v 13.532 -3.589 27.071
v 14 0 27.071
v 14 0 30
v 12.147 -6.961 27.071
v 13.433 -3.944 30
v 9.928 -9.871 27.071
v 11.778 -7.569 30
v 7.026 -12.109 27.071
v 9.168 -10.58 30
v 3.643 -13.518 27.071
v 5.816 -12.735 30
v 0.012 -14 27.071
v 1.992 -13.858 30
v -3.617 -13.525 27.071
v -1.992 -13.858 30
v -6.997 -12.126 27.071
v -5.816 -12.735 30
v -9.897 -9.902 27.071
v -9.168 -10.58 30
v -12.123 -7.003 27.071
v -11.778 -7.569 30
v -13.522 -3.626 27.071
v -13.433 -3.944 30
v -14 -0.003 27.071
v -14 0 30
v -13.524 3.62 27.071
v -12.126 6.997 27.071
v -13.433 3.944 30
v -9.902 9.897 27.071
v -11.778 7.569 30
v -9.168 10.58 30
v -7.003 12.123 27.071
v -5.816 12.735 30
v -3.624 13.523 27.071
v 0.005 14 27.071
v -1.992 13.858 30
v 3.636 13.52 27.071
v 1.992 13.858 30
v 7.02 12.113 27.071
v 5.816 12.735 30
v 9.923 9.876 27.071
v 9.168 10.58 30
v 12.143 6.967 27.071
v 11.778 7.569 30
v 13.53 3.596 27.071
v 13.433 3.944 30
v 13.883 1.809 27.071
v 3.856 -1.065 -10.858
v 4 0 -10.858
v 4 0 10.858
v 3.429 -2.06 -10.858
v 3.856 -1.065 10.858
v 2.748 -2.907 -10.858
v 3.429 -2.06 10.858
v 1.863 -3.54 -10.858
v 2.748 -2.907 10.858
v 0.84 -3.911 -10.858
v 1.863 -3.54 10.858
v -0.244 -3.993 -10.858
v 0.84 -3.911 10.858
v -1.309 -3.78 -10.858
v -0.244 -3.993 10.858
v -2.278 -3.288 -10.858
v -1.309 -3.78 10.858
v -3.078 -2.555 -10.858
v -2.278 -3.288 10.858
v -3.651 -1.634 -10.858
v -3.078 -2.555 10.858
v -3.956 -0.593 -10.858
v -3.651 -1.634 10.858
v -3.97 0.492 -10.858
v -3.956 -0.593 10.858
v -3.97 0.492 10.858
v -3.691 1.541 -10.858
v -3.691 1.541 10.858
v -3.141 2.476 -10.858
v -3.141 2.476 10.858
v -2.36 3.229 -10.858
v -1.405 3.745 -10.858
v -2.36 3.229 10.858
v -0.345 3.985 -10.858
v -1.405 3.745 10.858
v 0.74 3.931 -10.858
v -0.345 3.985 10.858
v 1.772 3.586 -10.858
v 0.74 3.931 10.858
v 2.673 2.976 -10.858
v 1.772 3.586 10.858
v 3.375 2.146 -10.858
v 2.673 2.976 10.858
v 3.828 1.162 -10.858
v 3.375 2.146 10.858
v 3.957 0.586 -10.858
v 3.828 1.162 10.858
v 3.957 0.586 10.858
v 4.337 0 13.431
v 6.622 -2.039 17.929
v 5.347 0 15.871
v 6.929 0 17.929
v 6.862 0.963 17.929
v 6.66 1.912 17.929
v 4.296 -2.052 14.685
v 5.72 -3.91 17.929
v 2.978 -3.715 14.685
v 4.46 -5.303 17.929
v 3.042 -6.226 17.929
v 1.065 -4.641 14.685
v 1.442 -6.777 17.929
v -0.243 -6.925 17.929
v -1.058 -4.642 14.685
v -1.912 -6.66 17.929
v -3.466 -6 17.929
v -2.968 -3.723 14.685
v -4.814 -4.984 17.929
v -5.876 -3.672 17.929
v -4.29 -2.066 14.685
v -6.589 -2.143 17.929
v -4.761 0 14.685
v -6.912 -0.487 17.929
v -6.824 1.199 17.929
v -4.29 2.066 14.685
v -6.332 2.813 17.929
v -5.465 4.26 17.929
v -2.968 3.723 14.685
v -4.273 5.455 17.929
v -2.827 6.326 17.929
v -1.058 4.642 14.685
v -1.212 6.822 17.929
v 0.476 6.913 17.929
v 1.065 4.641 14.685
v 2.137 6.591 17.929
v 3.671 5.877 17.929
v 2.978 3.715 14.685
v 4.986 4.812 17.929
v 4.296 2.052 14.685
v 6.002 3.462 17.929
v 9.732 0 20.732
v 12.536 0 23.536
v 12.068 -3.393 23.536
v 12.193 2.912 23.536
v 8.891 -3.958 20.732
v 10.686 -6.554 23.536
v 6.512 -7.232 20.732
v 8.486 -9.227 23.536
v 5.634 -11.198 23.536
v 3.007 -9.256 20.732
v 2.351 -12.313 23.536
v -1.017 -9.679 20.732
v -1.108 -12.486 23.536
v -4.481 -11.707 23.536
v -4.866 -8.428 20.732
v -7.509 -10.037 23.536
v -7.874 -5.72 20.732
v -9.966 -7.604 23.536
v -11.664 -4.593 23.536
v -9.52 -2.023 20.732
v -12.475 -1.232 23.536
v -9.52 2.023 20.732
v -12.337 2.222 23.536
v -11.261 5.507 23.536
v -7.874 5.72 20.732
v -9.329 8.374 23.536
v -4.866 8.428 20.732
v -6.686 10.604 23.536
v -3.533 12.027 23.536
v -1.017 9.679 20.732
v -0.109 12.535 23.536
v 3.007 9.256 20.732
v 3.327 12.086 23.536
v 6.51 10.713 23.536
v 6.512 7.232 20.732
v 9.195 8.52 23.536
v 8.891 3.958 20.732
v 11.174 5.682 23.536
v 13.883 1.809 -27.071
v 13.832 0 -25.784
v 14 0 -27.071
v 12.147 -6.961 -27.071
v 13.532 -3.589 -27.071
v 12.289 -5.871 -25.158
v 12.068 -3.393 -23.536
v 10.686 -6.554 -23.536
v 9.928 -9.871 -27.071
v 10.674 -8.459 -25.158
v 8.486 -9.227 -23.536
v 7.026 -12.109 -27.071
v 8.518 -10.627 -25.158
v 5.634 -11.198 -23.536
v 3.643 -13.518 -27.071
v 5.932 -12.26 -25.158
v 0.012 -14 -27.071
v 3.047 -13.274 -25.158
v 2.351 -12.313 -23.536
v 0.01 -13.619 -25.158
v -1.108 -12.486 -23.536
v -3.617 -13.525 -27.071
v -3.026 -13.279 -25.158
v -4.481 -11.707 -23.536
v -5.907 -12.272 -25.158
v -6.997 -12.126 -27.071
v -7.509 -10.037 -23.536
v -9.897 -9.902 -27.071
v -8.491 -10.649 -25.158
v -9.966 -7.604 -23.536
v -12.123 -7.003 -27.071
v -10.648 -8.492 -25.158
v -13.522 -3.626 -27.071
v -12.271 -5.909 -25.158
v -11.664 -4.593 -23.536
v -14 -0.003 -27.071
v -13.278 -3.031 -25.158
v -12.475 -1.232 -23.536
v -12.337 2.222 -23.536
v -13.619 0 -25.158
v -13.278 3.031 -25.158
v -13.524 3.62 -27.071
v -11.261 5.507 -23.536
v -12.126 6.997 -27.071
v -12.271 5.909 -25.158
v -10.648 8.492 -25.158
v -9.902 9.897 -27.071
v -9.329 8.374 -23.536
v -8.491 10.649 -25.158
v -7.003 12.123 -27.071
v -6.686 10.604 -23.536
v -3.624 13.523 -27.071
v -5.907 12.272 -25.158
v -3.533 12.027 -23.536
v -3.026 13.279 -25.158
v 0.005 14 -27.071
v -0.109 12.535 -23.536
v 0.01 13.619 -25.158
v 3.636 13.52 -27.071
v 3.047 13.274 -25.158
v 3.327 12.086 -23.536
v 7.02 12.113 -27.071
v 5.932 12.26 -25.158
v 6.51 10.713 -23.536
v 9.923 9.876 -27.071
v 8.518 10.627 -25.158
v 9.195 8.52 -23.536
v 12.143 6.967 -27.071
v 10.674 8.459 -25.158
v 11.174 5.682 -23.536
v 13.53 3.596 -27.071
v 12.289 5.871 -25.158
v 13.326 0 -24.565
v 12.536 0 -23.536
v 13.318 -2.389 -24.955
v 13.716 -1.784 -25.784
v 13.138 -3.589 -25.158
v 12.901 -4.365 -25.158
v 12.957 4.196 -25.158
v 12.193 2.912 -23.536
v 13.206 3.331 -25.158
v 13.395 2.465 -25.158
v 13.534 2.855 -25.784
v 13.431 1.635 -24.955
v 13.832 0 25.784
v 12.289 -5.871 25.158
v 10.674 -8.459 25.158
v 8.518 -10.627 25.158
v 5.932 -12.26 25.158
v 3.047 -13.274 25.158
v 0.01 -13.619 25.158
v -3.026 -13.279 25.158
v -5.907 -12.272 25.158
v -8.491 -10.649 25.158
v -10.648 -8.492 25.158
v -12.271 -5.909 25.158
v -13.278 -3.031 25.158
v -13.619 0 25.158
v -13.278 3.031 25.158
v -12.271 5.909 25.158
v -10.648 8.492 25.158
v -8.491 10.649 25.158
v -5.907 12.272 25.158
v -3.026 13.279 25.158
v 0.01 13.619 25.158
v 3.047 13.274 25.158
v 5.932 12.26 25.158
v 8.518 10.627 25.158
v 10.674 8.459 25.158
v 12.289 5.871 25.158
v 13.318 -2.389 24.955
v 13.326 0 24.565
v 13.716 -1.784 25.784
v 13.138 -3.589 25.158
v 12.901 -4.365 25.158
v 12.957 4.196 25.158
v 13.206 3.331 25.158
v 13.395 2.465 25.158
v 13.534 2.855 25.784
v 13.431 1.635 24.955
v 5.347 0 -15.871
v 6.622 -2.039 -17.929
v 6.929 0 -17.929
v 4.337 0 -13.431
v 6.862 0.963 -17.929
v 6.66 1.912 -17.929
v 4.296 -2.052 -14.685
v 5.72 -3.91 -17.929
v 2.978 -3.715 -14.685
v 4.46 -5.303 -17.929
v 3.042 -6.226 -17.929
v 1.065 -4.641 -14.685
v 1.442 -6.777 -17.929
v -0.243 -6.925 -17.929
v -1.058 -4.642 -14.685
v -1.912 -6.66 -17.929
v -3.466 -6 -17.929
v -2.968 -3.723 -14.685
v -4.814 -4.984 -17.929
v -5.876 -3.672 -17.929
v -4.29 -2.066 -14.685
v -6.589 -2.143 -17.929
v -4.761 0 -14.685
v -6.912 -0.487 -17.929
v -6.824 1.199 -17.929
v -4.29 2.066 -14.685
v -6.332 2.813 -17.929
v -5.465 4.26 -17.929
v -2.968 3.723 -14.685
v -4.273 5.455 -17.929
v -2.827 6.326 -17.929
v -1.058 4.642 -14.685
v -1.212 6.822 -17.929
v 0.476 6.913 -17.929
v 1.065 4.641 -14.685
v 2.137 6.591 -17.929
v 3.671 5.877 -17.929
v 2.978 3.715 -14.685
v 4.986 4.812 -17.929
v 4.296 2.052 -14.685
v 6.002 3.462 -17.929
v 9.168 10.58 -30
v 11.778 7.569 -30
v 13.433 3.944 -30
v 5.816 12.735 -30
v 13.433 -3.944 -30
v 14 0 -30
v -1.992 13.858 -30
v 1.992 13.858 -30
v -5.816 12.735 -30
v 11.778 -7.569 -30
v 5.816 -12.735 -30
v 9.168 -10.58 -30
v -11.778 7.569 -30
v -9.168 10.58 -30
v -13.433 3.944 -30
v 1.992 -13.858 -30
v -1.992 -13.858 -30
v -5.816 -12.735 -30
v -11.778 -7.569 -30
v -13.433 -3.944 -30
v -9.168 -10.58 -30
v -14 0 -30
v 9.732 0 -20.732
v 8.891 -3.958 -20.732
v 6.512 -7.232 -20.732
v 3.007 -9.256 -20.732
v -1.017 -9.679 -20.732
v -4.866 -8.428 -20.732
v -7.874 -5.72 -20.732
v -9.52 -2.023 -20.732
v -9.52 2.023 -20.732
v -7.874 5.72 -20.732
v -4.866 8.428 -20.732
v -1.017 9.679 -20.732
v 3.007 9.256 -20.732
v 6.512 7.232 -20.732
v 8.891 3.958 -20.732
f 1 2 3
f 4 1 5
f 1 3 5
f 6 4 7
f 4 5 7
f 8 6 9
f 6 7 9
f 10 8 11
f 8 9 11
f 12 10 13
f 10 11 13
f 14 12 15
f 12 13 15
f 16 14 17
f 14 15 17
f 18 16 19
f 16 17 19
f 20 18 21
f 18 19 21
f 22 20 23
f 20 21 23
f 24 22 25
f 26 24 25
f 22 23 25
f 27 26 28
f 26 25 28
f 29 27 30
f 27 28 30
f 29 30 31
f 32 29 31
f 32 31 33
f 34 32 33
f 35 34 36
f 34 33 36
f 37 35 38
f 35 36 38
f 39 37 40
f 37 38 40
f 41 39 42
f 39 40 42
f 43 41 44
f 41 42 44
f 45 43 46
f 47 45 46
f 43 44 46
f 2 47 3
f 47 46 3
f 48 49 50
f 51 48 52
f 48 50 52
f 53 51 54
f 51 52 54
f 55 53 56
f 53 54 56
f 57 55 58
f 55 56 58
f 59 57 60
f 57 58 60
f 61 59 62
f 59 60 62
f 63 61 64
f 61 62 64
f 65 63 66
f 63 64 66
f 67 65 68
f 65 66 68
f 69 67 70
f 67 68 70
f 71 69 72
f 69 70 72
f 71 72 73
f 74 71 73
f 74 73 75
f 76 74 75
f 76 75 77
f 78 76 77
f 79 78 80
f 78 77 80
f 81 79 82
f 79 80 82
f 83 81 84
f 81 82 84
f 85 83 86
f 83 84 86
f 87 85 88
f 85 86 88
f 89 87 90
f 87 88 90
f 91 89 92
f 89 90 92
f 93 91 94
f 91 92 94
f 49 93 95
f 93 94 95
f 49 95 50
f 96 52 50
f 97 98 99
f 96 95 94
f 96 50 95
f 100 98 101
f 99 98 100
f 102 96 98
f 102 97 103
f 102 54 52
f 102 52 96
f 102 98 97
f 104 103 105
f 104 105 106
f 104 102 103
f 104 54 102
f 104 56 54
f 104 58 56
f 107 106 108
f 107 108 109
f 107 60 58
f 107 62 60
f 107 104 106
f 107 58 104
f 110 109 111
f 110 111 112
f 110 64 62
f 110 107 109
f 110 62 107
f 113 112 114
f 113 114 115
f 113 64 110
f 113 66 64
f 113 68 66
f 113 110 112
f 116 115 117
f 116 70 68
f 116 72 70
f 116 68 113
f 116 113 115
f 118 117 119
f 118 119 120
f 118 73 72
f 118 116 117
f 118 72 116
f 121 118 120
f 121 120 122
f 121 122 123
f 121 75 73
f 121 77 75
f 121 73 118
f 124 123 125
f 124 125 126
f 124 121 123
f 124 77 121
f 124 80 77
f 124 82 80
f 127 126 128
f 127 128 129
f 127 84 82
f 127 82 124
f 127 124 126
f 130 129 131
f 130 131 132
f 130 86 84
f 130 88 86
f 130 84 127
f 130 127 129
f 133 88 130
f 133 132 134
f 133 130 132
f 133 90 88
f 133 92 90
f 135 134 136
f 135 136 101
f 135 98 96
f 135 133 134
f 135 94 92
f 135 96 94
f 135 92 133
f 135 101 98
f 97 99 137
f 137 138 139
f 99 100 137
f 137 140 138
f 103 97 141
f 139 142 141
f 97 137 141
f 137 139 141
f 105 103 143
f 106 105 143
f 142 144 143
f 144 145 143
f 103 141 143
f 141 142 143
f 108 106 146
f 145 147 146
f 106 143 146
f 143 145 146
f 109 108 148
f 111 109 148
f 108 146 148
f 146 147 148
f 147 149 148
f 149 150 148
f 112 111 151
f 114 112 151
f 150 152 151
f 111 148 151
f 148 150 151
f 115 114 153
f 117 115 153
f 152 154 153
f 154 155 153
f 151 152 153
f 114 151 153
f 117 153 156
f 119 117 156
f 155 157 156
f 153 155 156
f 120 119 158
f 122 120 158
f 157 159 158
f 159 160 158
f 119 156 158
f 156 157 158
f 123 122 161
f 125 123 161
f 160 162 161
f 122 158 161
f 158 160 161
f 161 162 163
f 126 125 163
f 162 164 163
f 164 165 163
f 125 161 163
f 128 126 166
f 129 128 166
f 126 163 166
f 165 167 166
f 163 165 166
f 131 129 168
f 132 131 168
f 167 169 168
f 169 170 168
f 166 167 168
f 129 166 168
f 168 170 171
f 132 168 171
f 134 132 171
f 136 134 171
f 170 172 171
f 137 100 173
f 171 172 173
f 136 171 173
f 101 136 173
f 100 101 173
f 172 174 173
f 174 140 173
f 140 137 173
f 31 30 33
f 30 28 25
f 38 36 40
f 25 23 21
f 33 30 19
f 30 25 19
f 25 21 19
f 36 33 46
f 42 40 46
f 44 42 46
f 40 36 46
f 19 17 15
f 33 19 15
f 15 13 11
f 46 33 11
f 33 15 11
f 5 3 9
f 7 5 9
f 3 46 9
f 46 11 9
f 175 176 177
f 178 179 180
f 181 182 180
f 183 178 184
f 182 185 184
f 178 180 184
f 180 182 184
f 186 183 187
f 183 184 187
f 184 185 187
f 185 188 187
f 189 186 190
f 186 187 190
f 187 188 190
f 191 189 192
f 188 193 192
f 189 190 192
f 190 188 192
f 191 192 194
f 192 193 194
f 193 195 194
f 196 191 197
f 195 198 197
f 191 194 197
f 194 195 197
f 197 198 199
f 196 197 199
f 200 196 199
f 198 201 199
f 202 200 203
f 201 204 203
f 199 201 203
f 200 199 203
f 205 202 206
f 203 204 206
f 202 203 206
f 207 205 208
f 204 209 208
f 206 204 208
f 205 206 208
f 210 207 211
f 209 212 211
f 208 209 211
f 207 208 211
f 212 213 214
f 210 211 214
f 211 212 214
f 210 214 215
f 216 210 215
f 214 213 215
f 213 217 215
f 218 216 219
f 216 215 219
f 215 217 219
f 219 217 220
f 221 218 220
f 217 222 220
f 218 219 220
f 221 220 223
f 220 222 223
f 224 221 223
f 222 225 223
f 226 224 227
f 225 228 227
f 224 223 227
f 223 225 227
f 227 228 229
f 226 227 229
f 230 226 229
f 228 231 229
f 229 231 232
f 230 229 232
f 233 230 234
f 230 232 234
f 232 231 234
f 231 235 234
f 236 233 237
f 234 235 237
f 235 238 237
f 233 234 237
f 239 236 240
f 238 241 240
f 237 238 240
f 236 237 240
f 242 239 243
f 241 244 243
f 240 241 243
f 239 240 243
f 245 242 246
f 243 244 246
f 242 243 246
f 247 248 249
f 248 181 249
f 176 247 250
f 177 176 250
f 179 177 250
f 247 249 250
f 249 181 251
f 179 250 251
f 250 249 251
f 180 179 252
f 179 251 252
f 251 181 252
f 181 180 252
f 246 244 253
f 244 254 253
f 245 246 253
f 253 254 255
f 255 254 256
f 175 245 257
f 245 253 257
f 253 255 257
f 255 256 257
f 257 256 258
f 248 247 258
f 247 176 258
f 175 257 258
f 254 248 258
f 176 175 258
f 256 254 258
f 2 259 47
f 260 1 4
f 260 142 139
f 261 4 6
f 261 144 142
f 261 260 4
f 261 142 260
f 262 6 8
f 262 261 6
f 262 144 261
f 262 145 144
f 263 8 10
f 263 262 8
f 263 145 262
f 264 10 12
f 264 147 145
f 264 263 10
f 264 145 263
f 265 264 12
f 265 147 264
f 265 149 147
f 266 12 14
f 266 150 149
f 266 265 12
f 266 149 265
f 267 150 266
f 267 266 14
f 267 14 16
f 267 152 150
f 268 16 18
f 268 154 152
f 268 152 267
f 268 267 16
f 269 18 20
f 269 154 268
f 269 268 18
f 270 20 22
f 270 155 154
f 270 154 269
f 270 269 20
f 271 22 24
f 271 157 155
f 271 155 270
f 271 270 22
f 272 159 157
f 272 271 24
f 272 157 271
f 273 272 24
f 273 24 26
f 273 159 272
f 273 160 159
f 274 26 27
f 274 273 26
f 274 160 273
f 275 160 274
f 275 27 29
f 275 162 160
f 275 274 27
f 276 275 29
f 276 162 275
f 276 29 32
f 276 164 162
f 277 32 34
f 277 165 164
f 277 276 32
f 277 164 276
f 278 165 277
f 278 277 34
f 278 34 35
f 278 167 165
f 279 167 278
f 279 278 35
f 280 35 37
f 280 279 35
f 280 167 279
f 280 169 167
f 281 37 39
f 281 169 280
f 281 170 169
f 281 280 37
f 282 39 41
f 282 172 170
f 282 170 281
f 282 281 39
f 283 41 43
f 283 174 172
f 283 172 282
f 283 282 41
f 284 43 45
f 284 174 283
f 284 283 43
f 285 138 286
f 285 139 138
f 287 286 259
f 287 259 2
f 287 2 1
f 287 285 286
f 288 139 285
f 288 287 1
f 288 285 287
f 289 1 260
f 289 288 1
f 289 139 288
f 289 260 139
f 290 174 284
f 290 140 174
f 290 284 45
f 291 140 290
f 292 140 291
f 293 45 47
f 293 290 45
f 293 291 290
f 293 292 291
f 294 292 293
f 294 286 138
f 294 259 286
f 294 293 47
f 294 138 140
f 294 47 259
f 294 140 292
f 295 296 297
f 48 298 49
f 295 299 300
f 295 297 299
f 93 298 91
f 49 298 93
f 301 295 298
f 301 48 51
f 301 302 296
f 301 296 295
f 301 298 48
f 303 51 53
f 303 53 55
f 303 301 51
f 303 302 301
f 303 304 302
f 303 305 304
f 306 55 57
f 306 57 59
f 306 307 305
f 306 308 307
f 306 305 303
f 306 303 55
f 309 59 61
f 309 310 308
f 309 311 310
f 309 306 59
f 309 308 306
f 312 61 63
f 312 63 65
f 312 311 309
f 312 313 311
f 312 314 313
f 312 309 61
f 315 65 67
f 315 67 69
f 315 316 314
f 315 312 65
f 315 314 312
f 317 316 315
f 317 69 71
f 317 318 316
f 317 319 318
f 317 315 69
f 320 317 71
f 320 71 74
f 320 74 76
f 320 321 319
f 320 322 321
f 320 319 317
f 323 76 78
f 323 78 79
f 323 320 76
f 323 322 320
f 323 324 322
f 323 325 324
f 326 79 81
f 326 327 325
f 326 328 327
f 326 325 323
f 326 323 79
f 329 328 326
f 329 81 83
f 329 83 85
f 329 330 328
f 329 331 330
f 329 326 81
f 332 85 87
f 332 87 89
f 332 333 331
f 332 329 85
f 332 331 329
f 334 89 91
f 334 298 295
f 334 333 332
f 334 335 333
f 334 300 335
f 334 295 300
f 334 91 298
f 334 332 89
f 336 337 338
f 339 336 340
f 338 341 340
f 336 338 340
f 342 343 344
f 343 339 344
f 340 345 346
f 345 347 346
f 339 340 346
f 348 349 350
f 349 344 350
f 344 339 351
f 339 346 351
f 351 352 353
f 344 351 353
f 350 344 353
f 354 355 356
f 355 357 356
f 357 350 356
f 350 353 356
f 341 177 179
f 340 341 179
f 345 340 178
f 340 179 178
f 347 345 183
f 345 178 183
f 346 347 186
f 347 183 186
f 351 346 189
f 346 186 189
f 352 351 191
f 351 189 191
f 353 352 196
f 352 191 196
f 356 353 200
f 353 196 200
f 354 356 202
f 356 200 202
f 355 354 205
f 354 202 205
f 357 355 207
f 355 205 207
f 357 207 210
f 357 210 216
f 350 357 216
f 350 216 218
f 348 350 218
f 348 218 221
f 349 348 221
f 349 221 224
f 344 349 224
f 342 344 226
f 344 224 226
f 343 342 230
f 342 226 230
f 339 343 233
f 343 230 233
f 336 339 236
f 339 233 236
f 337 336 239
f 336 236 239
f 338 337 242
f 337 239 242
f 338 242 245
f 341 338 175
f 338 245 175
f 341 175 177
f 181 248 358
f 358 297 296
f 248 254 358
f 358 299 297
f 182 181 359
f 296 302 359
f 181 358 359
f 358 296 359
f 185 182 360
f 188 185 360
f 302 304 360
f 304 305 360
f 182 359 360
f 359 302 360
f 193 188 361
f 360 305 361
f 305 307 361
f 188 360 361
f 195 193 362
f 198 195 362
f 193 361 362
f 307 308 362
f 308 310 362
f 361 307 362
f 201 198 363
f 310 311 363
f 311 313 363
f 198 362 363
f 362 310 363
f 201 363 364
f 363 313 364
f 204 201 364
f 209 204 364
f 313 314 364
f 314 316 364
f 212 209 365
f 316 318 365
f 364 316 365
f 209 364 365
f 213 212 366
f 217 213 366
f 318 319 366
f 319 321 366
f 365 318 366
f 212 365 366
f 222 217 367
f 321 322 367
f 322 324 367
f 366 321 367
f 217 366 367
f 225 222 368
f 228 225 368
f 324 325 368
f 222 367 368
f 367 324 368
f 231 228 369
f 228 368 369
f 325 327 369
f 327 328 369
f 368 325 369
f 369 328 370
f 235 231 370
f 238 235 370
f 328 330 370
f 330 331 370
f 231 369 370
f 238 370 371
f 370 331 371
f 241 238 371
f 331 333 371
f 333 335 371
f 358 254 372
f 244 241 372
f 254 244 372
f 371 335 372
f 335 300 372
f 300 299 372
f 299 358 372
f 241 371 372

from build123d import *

# Parameters (mm, degrees)
F2_R = 10
F3_R = 5


with BuildPart() as f1:
    # F0 (on Front) → F1 (revolve)
    with BuildSketch(Plane.XZ):
        Polygon((14, 30), (0, 30), (0, -30), (14, -30), (14, -25), (4, -15), (4, 0), (4, 15), (14, 25), align=None)
    revolve(axis=Axis((0, 0, 0), (0, 0, -1)))

    # F2
    f2_edges = [f1.edges().sort_by_distance(p)[0] for p in [
        (-4, 0, 15),
        (-4, 0, -15),
    ]]
    fillet(f2_edges, radius=F2_R)

    # F3
    f3_edges = [f1.edges().sort_by_distance(p)[0] for p in [
        (-14, 0, 25),
        (-14, 0, -25),
    ]]
    fillet(f3_edges, radius=F3_R)


solid = f1.part
